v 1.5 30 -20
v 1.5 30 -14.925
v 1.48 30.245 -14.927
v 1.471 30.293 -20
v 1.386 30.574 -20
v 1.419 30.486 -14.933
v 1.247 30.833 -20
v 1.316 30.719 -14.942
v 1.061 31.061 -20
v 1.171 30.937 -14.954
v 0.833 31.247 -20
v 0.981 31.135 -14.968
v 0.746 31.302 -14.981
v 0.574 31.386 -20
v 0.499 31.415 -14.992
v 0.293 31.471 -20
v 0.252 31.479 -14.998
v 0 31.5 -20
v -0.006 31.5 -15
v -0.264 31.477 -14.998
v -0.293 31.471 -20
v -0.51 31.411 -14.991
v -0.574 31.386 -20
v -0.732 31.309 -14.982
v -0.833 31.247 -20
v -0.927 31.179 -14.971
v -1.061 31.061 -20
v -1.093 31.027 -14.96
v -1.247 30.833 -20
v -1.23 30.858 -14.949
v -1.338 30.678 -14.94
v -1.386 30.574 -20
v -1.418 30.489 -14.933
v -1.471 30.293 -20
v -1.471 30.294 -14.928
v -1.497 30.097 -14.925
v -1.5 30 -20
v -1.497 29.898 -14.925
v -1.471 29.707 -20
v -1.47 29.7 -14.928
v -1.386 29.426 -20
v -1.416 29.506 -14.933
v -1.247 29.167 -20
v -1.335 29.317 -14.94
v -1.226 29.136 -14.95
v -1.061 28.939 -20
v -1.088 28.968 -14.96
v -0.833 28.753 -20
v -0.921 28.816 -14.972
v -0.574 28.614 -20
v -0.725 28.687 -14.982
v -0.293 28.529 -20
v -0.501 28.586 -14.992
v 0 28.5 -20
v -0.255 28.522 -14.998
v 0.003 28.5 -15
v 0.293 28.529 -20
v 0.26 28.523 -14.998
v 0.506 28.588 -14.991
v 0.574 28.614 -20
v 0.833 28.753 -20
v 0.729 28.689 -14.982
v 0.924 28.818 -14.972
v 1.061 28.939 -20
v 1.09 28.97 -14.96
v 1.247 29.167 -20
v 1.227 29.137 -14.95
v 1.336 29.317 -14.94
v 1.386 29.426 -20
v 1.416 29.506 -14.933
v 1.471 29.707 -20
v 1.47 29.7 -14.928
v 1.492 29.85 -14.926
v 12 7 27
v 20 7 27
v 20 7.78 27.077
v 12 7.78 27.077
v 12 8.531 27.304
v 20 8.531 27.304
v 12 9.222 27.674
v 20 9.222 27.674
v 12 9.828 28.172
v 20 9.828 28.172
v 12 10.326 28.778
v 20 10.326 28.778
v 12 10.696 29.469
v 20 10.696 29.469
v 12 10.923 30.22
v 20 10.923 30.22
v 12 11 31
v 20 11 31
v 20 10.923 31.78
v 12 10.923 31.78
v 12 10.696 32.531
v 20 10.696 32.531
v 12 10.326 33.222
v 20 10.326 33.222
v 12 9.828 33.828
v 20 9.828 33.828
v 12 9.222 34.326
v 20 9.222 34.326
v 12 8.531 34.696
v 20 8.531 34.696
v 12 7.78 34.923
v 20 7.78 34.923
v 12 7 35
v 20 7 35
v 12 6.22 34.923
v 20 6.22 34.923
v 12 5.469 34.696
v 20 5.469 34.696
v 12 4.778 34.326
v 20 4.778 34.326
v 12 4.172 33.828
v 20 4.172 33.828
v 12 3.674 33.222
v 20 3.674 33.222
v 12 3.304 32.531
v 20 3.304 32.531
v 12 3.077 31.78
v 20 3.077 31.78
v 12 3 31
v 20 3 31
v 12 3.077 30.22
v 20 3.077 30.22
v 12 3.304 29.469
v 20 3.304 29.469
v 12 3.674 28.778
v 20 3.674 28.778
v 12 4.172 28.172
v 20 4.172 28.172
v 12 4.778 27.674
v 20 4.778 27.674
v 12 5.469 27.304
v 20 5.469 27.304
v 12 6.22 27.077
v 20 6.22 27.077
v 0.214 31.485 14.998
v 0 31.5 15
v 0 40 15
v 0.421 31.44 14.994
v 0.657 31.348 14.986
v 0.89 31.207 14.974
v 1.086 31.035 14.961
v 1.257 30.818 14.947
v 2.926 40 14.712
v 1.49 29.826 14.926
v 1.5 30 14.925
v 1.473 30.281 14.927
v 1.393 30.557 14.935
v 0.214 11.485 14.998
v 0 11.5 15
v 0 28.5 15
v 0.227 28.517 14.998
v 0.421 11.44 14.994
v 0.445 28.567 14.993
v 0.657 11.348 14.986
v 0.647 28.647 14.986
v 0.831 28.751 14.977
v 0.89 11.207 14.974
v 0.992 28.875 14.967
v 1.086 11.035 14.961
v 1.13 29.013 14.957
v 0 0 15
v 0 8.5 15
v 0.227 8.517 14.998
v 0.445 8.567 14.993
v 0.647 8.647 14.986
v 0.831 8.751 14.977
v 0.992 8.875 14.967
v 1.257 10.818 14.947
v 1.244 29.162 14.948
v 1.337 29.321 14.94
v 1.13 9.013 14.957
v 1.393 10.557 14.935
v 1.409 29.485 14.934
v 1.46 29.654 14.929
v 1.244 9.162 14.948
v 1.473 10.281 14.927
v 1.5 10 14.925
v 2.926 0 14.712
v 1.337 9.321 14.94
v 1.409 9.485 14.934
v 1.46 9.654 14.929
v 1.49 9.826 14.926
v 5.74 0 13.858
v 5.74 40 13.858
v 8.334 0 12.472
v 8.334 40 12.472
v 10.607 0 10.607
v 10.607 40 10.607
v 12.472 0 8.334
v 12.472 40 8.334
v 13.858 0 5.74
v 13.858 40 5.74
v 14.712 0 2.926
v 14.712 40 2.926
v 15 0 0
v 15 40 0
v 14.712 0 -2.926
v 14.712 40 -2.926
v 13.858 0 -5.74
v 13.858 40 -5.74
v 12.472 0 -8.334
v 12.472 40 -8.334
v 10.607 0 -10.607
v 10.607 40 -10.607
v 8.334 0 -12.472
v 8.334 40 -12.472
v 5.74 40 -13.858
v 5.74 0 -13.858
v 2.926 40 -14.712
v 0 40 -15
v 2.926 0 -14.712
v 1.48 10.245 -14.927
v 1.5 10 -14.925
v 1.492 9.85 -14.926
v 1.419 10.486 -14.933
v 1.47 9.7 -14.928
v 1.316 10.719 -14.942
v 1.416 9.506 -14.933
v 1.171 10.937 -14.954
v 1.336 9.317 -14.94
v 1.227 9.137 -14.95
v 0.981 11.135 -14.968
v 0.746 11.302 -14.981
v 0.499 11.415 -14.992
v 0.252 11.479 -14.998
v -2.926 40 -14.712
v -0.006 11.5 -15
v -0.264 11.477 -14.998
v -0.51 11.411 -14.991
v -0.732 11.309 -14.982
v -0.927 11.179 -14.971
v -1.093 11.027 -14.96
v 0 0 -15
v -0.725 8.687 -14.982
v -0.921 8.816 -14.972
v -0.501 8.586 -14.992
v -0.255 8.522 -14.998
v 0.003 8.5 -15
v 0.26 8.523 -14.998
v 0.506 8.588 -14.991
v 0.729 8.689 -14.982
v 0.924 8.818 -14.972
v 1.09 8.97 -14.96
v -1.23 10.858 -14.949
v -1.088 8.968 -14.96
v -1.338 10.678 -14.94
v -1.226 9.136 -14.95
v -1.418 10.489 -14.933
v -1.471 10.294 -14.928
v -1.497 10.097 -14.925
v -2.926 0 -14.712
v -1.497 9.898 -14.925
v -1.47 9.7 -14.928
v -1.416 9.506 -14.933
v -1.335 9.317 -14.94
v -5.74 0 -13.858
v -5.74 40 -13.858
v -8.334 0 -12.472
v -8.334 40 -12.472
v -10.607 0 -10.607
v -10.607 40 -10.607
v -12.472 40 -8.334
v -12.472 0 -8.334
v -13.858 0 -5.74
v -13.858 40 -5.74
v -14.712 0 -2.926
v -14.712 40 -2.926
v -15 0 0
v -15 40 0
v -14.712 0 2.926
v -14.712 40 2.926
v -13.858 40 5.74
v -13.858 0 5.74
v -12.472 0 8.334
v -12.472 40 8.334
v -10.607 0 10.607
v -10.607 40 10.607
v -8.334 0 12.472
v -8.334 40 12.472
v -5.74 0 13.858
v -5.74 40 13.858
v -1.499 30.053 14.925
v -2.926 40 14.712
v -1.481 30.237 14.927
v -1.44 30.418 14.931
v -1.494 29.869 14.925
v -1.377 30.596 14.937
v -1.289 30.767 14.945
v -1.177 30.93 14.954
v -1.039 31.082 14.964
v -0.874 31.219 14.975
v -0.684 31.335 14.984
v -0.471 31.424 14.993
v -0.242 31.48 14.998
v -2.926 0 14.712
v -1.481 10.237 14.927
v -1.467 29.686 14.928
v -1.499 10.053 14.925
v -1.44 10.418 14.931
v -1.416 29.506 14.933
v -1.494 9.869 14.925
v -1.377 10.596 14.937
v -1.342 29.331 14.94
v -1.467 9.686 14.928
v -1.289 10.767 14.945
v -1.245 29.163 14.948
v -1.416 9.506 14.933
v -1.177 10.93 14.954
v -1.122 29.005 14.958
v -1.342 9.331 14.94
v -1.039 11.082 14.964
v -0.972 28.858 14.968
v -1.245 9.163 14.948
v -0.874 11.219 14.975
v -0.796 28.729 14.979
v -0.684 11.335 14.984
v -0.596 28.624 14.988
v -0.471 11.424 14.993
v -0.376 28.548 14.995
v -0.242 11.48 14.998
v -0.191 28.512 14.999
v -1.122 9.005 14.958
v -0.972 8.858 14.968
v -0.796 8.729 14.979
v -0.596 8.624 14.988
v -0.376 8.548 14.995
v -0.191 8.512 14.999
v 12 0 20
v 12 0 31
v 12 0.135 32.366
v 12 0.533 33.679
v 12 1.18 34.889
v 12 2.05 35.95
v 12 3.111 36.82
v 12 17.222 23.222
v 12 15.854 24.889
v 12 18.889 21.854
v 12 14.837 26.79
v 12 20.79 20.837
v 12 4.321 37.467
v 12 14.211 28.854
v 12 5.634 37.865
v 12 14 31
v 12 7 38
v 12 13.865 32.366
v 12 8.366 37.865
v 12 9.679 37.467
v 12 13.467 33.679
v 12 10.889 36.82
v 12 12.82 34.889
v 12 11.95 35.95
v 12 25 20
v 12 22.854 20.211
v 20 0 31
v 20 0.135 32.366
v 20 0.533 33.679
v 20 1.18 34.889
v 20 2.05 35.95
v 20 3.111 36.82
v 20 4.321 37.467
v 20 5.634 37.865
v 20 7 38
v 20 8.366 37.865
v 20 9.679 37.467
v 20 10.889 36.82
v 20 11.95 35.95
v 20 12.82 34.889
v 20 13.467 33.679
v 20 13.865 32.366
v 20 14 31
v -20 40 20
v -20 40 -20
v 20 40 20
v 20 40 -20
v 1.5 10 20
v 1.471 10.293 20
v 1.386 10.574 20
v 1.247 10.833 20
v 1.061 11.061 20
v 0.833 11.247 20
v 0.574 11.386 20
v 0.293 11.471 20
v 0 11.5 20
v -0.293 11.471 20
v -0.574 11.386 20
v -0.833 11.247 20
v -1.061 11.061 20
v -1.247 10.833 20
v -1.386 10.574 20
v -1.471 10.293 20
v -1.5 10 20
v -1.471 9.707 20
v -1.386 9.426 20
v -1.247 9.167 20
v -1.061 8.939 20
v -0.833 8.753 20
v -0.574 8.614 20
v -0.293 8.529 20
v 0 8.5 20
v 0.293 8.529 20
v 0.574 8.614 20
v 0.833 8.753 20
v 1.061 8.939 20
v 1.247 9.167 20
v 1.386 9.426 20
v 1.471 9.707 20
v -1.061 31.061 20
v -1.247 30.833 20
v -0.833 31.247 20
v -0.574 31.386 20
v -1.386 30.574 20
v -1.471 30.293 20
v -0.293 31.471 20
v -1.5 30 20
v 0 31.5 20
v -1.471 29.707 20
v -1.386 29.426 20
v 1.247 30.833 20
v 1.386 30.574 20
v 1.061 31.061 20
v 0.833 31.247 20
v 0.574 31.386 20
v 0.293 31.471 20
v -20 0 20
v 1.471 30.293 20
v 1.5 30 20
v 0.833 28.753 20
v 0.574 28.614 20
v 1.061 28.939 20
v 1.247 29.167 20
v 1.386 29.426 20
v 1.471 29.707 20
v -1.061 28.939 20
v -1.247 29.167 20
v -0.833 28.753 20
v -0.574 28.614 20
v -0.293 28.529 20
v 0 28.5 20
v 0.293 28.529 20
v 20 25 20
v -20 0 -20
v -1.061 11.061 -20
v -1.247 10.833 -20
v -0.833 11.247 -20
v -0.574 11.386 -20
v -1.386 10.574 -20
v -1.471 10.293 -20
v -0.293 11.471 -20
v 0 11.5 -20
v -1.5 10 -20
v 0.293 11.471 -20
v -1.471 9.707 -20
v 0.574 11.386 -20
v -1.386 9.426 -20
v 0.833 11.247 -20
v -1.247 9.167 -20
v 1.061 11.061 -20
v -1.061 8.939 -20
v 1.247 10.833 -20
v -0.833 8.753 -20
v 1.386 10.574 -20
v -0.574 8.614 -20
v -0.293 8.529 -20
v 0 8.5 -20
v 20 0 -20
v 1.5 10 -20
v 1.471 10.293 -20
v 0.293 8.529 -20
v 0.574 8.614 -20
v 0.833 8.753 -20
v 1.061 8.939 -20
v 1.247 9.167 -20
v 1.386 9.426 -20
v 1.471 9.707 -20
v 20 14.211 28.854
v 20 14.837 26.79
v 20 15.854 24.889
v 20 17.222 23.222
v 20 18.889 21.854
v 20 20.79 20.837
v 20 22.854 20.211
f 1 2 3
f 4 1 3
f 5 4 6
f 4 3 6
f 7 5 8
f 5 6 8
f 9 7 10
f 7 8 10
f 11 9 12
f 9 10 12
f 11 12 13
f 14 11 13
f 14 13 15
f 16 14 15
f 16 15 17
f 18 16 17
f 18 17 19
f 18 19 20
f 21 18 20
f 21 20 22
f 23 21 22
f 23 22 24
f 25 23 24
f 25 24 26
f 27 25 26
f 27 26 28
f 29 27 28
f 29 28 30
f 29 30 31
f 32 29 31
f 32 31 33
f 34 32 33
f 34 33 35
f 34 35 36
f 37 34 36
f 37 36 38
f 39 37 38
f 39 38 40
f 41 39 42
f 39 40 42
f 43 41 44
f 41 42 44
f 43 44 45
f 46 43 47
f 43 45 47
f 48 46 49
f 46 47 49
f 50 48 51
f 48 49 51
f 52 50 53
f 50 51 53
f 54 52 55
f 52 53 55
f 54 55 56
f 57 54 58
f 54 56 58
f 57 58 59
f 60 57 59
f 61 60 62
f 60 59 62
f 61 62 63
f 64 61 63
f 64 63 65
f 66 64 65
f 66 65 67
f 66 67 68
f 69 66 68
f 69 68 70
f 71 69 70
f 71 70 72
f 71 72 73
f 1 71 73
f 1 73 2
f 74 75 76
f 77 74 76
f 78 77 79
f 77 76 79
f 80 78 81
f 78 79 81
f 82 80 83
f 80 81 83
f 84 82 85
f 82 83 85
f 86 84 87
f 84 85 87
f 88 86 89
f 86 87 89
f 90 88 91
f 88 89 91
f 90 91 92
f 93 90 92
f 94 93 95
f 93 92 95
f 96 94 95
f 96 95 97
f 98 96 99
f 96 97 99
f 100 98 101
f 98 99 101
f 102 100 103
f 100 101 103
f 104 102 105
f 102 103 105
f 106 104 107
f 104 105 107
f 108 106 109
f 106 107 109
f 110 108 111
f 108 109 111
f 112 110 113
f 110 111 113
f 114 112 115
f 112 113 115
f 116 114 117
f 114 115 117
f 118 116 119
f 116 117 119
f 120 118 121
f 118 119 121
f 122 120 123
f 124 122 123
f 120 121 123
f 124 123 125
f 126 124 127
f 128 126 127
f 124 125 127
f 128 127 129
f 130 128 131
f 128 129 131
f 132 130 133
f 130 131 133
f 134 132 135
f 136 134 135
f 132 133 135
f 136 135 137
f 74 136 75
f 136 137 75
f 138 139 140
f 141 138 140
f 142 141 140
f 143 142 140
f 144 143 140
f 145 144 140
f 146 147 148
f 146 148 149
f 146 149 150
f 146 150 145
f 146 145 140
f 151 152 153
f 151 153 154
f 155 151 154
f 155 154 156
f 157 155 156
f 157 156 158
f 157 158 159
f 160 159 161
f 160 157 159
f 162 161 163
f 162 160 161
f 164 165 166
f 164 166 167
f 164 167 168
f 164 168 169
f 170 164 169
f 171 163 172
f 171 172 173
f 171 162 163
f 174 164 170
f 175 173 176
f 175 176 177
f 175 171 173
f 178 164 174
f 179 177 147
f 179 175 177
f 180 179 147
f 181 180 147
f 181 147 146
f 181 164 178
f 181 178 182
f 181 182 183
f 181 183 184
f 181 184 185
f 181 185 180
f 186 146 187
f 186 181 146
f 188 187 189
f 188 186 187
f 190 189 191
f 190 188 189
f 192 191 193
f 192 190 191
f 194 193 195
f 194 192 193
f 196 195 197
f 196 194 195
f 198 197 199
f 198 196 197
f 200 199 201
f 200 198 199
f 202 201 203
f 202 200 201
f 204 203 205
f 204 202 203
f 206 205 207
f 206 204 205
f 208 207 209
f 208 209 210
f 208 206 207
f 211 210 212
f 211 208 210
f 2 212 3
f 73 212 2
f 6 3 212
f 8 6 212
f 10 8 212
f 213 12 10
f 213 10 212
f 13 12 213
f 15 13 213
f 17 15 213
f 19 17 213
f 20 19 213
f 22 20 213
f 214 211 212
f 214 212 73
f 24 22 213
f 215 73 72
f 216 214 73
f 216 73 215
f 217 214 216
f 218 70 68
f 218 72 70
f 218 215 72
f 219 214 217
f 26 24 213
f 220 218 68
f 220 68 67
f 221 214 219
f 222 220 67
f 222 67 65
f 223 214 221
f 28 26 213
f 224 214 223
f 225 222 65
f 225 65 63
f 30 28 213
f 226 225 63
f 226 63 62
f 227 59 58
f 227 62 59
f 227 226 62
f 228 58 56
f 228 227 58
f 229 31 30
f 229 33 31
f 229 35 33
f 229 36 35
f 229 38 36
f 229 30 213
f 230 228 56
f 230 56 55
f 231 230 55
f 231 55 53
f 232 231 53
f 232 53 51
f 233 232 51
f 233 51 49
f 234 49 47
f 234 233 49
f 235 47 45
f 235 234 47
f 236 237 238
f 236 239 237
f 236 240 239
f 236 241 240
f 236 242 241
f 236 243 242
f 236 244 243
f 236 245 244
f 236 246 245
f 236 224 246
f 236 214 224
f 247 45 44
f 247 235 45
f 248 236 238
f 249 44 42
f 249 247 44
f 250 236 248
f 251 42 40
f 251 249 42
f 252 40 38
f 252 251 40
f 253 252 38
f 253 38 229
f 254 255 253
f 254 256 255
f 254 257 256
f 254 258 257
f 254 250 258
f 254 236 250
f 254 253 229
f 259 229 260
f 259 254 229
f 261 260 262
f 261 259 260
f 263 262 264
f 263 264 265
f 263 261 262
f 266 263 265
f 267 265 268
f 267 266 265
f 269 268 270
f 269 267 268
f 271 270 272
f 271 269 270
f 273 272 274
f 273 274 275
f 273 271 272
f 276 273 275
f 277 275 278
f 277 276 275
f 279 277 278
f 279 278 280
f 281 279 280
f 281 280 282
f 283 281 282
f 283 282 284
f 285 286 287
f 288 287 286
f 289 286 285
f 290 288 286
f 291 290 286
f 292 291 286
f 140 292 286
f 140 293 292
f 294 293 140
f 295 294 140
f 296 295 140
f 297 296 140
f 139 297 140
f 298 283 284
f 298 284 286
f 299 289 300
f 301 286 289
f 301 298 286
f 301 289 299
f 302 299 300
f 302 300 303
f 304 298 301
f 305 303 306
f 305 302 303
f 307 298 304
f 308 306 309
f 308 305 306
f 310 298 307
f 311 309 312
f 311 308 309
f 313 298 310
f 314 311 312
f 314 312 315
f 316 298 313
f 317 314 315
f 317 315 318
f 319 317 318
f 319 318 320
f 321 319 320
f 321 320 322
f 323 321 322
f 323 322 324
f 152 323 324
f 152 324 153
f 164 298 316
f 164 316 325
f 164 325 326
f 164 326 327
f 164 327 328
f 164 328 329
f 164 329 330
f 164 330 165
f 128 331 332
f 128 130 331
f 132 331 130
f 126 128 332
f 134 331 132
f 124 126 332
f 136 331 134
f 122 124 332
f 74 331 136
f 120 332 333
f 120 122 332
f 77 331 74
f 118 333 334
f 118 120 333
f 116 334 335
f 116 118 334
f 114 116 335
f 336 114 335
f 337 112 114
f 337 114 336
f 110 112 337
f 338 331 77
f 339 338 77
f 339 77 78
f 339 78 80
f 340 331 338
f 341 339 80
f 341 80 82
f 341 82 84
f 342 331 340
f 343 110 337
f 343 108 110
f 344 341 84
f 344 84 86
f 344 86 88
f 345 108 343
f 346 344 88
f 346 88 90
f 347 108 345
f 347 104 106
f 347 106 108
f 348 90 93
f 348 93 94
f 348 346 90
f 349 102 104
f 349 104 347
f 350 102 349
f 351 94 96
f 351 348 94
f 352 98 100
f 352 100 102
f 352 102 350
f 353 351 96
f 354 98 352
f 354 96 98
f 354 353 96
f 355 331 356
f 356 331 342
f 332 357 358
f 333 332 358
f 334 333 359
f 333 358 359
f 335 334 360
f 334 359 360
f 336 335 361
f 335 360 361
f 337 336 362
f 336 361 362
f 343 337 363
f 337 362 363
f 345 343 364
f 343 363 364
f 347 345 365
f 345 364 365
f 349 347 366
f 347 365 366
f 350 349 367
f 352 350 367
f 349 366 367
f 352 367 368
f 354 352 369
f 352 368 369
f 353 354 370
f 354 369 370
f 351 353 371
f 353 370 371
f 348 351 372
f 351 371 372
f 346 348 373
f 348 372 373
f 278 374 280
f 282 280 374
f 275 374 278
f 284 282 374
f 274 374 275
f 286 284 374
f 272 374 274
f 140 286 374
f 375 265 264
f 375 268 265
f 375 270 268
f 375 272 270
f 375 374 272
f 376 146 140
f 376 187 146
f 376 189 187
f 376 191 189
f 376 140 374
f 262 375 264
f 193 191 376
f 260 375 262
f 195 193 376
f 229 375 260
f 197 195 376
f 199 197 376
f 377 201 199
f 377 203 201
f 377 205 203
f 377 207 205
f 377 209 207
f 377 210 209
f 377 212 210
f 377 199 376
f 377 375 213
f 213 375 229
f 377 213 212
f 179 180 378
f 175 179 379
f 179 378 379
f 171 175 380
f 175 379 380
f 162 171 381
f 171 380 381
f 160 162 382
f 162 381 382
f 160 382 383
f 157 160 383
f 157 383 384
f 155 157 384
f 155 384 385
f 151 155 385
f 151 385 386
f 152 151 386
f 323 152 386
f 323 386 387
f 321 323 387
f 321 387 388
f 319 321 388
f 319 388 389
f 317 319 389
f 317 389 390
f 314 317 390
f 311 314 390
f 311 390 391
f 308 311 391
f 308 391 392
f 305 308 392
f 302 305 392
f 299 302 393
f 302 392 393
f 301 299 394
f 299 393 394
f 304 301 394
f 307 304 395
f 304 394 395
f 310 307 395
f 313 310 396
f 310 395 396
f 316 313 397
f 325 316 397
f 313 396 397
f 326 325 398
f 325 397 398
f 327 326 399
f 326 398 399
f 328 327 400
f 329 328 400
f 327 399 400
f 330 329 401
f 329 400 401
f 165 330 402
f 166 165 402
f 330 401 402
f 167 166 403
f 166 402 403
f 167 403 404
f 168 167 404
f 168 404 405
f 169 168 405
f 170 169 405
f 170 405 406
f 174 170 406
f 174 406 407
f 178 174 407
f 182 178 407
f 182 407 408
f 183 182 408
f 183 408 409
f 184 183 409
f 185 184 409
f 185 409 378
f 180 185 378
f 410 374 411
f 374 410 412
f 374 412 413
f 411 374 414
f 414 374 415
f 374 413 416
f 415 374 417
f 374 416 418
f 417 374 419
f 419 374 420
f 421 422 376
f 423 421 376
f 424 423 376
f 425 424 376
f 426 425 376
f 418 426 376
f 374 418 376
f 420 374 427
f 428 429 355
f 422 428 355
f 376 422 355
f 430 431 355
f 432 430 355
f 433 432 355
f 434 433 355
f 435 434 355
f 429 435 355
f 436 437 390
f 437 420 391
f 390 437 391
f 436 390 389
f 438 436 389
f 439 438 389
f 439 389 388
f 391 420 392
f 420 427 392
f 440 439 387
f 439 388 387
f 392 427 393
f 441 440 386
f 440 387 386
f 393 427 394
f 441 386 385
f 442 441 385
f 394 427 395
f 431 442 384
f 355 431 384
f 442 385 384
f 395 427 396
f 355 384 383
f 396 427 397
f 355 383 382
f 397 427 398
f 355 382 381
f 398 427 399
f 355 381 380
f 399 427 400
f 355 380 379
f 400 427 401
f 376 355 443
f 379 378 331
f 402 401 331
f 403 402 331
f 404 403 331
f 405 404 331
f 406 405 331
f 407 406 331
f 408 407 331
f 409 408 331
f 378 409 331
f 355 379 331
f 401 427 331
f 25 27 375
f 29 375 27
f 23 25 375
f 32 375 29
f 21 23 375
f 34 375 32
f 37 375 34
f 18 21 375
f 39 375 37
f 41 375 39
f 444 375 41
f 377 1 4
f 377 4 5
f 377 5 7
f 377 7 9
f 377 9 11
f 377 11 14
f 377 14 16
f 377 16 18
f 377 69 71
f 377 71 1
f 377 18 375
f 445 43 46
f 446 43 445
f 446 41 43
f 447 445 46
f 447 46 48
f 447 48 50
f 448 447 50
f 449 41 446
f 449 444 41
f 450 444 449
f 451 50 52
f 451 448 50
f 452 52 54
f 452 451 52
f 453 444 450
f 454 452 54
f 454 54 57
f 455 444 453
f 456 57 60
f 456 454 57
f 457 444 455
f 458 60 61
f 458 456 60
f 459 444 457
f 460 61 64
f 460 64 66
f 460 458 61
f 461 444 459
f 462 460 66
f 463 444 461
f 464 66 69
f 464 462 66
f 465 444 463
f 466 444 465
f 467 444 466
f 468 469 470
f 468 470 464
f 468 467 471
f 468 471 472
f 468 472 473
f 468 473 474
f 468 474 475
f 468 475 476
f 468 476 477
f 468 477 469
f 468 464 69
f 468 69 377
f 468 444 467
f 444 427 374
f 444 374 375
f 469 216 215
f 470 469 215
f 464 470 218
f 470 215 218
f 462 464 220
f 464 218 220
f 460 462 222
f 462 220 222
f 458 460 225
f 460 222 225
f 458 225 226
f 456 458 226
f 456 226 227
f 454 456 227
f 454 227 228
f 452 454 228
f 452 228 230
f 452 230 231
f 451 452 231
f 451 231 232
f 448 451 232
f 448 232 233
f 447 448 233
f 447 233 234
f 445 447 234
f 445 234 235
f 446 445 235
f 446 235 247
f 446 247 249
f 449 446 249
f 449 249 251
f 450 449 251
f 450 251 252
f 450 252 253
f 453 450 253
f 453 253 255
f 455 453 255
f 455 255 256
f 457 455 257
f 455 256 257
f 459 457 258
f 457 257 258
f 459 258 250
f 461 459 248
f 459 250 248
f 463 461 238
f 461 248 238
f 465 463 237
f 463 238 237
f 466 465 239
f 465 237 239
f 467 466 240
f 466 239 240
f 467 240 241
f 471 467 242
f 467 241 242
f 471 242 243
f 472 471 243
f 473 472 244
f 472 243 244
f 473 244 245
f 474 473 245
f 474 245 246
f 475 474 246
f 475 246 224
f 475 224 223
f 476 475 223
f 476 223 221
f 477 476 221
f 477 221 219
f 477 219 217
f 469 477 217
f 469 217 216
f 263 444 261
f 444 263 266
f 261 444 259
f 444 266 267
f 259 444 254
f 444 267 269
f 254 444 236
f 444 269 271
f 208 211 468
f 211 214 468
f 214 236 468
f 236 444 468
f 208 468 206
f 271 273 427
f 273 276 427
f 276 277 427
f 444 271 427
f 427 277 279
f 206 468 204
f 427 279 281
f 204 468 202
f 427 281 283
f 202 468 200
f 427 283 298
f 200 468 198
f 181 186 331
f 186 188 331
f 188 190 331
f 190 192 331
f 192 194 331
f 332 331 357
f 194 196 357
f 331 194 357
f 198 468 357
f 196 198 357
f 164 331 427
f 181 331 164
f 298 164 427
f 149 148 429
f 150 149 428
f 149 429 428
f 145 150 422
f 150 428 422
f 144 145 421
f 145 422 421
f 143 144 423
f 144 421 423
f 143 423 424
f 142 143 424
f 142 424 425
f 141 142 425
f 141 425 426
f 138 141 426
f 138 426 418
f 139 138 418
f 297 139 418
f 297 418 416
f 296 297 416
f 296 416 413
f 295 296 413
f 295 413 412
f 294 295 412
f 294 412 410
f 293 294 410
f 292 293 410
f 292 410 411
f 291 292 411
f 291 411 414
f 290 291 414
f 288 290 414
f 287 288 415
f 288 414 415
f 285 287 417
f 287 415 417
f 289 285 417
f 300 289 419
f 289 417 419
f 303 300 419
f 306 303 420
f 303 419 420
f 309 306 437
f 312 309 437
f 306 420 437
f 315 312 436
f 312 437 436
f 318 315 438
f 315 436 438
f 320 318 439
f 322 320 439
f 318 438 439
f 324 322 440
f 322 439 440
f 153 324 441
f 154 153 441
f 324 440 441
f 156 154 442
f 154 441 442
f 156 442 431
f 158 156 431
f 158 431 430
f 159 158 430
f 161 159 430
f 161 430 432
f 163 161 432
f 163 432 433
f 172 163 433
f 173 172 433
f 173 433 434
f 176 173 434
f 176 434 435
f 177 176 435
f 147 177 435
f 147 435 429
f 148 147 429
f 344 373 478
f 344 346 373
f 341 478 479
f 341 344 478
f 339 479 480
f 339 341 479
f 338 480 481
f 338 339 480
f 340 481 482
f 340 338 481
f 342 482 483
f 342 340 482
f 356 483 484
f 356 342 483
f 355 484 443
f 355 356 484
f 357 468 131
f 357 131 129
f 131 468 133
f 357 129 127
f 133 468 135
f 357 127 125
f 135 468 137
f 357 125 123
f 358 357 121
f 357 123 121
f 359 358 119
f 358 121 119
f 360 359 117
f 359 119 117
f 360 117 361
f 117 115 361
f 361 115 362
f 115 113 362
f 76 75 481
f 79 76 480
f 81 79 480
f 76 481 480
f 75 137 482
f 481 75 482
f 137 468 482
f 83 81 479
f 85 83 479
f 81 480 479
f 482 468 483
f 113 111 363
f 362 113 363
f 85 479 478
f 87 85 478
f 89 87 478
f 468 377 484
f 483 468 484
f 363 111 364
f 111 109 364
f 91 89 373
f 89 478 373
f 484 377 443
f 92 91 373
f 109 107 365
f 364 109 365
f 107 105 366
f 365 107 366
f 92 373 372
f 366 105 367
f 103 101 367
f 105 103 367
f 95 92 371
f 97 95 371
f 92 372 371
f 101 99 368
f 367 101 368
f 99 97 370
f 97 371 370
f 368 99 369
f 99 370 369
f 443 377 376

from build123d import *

# Parameters (mm, degrees)
SKETCH_1_W          = 40
SKETCH_1_H          = 40
SKETCH_1_R          = 15
EXTRUDE_1_DEPTH     = 40
SKETCH_2_R          = 1.5
CUT_EXTRUDE_1_DEPTH = 61
SKETCH_3_R          = 4
EXTRUDE_2_DEPTH     = 8
FILLET_1_R          = 11


with BuildPart() as part:
    # 草圖1 → 填料-伸長1 (new body)
    with BuildSketch(Plane(origin=(0, 0, 0), x_dir=(1, 0, 0), z_dir=(0, 1, 0))):
        Rectangle(SKETCH_1_W, SKETCH_1_H)
        with Locations(Location((0, 0, 0), (0, 0, 270))):
            Circle(SKETCH_1_R, mode=Mode.SUBTRACT)
    extrude(amount=EXTRUDE_1_DEPTH)

    # 草圖2 → 除料-伸長1 (cut, through all)
    with BuildSketch(Plane.XY.offset(20)):
        with Locations((0, 10)):
            Circle(SKETCH_2_R)
        with Locations((0, 30)):
            Circle(SKETCH_2_R)
    extrude(amount=-CUT_EXTRUDE_1_DEPTH, mode=Mode.SUBTRACT)

    # 草圖3 → 填料-伸長2 (add)
    with BuildSketch(Plane(origin=(20, 0, 0), x_dir=(0, 0, -1), z_dir=(1, 0, 0))):
        with BuildLine():
            Line((-20, 0), (-31, 0))
            ThreePointArc((-31, 0), (-38, 7), (-31, 14))
            Line((-31, 14), (-20, 14))
            Line((-20, 14), (-20, 0))
        make_face()
        with Locations((-31, 7)):
            Circle(SKETCH_3_R, mode=Mode.SUBTRACT)
    extrude(amount=-EXTRUDE_2_DEPTH)

    # 圓角1
    fillet_1_edges = [part.edges().sort_by_distance(p)[0] for p in [
        (16, 14, 20),
    ]]
    fillet(fillet_1_edges, radius=FILLET_1_R - 0.0001)  # a hair under: the kernel refuses the full size


solid = part.part
